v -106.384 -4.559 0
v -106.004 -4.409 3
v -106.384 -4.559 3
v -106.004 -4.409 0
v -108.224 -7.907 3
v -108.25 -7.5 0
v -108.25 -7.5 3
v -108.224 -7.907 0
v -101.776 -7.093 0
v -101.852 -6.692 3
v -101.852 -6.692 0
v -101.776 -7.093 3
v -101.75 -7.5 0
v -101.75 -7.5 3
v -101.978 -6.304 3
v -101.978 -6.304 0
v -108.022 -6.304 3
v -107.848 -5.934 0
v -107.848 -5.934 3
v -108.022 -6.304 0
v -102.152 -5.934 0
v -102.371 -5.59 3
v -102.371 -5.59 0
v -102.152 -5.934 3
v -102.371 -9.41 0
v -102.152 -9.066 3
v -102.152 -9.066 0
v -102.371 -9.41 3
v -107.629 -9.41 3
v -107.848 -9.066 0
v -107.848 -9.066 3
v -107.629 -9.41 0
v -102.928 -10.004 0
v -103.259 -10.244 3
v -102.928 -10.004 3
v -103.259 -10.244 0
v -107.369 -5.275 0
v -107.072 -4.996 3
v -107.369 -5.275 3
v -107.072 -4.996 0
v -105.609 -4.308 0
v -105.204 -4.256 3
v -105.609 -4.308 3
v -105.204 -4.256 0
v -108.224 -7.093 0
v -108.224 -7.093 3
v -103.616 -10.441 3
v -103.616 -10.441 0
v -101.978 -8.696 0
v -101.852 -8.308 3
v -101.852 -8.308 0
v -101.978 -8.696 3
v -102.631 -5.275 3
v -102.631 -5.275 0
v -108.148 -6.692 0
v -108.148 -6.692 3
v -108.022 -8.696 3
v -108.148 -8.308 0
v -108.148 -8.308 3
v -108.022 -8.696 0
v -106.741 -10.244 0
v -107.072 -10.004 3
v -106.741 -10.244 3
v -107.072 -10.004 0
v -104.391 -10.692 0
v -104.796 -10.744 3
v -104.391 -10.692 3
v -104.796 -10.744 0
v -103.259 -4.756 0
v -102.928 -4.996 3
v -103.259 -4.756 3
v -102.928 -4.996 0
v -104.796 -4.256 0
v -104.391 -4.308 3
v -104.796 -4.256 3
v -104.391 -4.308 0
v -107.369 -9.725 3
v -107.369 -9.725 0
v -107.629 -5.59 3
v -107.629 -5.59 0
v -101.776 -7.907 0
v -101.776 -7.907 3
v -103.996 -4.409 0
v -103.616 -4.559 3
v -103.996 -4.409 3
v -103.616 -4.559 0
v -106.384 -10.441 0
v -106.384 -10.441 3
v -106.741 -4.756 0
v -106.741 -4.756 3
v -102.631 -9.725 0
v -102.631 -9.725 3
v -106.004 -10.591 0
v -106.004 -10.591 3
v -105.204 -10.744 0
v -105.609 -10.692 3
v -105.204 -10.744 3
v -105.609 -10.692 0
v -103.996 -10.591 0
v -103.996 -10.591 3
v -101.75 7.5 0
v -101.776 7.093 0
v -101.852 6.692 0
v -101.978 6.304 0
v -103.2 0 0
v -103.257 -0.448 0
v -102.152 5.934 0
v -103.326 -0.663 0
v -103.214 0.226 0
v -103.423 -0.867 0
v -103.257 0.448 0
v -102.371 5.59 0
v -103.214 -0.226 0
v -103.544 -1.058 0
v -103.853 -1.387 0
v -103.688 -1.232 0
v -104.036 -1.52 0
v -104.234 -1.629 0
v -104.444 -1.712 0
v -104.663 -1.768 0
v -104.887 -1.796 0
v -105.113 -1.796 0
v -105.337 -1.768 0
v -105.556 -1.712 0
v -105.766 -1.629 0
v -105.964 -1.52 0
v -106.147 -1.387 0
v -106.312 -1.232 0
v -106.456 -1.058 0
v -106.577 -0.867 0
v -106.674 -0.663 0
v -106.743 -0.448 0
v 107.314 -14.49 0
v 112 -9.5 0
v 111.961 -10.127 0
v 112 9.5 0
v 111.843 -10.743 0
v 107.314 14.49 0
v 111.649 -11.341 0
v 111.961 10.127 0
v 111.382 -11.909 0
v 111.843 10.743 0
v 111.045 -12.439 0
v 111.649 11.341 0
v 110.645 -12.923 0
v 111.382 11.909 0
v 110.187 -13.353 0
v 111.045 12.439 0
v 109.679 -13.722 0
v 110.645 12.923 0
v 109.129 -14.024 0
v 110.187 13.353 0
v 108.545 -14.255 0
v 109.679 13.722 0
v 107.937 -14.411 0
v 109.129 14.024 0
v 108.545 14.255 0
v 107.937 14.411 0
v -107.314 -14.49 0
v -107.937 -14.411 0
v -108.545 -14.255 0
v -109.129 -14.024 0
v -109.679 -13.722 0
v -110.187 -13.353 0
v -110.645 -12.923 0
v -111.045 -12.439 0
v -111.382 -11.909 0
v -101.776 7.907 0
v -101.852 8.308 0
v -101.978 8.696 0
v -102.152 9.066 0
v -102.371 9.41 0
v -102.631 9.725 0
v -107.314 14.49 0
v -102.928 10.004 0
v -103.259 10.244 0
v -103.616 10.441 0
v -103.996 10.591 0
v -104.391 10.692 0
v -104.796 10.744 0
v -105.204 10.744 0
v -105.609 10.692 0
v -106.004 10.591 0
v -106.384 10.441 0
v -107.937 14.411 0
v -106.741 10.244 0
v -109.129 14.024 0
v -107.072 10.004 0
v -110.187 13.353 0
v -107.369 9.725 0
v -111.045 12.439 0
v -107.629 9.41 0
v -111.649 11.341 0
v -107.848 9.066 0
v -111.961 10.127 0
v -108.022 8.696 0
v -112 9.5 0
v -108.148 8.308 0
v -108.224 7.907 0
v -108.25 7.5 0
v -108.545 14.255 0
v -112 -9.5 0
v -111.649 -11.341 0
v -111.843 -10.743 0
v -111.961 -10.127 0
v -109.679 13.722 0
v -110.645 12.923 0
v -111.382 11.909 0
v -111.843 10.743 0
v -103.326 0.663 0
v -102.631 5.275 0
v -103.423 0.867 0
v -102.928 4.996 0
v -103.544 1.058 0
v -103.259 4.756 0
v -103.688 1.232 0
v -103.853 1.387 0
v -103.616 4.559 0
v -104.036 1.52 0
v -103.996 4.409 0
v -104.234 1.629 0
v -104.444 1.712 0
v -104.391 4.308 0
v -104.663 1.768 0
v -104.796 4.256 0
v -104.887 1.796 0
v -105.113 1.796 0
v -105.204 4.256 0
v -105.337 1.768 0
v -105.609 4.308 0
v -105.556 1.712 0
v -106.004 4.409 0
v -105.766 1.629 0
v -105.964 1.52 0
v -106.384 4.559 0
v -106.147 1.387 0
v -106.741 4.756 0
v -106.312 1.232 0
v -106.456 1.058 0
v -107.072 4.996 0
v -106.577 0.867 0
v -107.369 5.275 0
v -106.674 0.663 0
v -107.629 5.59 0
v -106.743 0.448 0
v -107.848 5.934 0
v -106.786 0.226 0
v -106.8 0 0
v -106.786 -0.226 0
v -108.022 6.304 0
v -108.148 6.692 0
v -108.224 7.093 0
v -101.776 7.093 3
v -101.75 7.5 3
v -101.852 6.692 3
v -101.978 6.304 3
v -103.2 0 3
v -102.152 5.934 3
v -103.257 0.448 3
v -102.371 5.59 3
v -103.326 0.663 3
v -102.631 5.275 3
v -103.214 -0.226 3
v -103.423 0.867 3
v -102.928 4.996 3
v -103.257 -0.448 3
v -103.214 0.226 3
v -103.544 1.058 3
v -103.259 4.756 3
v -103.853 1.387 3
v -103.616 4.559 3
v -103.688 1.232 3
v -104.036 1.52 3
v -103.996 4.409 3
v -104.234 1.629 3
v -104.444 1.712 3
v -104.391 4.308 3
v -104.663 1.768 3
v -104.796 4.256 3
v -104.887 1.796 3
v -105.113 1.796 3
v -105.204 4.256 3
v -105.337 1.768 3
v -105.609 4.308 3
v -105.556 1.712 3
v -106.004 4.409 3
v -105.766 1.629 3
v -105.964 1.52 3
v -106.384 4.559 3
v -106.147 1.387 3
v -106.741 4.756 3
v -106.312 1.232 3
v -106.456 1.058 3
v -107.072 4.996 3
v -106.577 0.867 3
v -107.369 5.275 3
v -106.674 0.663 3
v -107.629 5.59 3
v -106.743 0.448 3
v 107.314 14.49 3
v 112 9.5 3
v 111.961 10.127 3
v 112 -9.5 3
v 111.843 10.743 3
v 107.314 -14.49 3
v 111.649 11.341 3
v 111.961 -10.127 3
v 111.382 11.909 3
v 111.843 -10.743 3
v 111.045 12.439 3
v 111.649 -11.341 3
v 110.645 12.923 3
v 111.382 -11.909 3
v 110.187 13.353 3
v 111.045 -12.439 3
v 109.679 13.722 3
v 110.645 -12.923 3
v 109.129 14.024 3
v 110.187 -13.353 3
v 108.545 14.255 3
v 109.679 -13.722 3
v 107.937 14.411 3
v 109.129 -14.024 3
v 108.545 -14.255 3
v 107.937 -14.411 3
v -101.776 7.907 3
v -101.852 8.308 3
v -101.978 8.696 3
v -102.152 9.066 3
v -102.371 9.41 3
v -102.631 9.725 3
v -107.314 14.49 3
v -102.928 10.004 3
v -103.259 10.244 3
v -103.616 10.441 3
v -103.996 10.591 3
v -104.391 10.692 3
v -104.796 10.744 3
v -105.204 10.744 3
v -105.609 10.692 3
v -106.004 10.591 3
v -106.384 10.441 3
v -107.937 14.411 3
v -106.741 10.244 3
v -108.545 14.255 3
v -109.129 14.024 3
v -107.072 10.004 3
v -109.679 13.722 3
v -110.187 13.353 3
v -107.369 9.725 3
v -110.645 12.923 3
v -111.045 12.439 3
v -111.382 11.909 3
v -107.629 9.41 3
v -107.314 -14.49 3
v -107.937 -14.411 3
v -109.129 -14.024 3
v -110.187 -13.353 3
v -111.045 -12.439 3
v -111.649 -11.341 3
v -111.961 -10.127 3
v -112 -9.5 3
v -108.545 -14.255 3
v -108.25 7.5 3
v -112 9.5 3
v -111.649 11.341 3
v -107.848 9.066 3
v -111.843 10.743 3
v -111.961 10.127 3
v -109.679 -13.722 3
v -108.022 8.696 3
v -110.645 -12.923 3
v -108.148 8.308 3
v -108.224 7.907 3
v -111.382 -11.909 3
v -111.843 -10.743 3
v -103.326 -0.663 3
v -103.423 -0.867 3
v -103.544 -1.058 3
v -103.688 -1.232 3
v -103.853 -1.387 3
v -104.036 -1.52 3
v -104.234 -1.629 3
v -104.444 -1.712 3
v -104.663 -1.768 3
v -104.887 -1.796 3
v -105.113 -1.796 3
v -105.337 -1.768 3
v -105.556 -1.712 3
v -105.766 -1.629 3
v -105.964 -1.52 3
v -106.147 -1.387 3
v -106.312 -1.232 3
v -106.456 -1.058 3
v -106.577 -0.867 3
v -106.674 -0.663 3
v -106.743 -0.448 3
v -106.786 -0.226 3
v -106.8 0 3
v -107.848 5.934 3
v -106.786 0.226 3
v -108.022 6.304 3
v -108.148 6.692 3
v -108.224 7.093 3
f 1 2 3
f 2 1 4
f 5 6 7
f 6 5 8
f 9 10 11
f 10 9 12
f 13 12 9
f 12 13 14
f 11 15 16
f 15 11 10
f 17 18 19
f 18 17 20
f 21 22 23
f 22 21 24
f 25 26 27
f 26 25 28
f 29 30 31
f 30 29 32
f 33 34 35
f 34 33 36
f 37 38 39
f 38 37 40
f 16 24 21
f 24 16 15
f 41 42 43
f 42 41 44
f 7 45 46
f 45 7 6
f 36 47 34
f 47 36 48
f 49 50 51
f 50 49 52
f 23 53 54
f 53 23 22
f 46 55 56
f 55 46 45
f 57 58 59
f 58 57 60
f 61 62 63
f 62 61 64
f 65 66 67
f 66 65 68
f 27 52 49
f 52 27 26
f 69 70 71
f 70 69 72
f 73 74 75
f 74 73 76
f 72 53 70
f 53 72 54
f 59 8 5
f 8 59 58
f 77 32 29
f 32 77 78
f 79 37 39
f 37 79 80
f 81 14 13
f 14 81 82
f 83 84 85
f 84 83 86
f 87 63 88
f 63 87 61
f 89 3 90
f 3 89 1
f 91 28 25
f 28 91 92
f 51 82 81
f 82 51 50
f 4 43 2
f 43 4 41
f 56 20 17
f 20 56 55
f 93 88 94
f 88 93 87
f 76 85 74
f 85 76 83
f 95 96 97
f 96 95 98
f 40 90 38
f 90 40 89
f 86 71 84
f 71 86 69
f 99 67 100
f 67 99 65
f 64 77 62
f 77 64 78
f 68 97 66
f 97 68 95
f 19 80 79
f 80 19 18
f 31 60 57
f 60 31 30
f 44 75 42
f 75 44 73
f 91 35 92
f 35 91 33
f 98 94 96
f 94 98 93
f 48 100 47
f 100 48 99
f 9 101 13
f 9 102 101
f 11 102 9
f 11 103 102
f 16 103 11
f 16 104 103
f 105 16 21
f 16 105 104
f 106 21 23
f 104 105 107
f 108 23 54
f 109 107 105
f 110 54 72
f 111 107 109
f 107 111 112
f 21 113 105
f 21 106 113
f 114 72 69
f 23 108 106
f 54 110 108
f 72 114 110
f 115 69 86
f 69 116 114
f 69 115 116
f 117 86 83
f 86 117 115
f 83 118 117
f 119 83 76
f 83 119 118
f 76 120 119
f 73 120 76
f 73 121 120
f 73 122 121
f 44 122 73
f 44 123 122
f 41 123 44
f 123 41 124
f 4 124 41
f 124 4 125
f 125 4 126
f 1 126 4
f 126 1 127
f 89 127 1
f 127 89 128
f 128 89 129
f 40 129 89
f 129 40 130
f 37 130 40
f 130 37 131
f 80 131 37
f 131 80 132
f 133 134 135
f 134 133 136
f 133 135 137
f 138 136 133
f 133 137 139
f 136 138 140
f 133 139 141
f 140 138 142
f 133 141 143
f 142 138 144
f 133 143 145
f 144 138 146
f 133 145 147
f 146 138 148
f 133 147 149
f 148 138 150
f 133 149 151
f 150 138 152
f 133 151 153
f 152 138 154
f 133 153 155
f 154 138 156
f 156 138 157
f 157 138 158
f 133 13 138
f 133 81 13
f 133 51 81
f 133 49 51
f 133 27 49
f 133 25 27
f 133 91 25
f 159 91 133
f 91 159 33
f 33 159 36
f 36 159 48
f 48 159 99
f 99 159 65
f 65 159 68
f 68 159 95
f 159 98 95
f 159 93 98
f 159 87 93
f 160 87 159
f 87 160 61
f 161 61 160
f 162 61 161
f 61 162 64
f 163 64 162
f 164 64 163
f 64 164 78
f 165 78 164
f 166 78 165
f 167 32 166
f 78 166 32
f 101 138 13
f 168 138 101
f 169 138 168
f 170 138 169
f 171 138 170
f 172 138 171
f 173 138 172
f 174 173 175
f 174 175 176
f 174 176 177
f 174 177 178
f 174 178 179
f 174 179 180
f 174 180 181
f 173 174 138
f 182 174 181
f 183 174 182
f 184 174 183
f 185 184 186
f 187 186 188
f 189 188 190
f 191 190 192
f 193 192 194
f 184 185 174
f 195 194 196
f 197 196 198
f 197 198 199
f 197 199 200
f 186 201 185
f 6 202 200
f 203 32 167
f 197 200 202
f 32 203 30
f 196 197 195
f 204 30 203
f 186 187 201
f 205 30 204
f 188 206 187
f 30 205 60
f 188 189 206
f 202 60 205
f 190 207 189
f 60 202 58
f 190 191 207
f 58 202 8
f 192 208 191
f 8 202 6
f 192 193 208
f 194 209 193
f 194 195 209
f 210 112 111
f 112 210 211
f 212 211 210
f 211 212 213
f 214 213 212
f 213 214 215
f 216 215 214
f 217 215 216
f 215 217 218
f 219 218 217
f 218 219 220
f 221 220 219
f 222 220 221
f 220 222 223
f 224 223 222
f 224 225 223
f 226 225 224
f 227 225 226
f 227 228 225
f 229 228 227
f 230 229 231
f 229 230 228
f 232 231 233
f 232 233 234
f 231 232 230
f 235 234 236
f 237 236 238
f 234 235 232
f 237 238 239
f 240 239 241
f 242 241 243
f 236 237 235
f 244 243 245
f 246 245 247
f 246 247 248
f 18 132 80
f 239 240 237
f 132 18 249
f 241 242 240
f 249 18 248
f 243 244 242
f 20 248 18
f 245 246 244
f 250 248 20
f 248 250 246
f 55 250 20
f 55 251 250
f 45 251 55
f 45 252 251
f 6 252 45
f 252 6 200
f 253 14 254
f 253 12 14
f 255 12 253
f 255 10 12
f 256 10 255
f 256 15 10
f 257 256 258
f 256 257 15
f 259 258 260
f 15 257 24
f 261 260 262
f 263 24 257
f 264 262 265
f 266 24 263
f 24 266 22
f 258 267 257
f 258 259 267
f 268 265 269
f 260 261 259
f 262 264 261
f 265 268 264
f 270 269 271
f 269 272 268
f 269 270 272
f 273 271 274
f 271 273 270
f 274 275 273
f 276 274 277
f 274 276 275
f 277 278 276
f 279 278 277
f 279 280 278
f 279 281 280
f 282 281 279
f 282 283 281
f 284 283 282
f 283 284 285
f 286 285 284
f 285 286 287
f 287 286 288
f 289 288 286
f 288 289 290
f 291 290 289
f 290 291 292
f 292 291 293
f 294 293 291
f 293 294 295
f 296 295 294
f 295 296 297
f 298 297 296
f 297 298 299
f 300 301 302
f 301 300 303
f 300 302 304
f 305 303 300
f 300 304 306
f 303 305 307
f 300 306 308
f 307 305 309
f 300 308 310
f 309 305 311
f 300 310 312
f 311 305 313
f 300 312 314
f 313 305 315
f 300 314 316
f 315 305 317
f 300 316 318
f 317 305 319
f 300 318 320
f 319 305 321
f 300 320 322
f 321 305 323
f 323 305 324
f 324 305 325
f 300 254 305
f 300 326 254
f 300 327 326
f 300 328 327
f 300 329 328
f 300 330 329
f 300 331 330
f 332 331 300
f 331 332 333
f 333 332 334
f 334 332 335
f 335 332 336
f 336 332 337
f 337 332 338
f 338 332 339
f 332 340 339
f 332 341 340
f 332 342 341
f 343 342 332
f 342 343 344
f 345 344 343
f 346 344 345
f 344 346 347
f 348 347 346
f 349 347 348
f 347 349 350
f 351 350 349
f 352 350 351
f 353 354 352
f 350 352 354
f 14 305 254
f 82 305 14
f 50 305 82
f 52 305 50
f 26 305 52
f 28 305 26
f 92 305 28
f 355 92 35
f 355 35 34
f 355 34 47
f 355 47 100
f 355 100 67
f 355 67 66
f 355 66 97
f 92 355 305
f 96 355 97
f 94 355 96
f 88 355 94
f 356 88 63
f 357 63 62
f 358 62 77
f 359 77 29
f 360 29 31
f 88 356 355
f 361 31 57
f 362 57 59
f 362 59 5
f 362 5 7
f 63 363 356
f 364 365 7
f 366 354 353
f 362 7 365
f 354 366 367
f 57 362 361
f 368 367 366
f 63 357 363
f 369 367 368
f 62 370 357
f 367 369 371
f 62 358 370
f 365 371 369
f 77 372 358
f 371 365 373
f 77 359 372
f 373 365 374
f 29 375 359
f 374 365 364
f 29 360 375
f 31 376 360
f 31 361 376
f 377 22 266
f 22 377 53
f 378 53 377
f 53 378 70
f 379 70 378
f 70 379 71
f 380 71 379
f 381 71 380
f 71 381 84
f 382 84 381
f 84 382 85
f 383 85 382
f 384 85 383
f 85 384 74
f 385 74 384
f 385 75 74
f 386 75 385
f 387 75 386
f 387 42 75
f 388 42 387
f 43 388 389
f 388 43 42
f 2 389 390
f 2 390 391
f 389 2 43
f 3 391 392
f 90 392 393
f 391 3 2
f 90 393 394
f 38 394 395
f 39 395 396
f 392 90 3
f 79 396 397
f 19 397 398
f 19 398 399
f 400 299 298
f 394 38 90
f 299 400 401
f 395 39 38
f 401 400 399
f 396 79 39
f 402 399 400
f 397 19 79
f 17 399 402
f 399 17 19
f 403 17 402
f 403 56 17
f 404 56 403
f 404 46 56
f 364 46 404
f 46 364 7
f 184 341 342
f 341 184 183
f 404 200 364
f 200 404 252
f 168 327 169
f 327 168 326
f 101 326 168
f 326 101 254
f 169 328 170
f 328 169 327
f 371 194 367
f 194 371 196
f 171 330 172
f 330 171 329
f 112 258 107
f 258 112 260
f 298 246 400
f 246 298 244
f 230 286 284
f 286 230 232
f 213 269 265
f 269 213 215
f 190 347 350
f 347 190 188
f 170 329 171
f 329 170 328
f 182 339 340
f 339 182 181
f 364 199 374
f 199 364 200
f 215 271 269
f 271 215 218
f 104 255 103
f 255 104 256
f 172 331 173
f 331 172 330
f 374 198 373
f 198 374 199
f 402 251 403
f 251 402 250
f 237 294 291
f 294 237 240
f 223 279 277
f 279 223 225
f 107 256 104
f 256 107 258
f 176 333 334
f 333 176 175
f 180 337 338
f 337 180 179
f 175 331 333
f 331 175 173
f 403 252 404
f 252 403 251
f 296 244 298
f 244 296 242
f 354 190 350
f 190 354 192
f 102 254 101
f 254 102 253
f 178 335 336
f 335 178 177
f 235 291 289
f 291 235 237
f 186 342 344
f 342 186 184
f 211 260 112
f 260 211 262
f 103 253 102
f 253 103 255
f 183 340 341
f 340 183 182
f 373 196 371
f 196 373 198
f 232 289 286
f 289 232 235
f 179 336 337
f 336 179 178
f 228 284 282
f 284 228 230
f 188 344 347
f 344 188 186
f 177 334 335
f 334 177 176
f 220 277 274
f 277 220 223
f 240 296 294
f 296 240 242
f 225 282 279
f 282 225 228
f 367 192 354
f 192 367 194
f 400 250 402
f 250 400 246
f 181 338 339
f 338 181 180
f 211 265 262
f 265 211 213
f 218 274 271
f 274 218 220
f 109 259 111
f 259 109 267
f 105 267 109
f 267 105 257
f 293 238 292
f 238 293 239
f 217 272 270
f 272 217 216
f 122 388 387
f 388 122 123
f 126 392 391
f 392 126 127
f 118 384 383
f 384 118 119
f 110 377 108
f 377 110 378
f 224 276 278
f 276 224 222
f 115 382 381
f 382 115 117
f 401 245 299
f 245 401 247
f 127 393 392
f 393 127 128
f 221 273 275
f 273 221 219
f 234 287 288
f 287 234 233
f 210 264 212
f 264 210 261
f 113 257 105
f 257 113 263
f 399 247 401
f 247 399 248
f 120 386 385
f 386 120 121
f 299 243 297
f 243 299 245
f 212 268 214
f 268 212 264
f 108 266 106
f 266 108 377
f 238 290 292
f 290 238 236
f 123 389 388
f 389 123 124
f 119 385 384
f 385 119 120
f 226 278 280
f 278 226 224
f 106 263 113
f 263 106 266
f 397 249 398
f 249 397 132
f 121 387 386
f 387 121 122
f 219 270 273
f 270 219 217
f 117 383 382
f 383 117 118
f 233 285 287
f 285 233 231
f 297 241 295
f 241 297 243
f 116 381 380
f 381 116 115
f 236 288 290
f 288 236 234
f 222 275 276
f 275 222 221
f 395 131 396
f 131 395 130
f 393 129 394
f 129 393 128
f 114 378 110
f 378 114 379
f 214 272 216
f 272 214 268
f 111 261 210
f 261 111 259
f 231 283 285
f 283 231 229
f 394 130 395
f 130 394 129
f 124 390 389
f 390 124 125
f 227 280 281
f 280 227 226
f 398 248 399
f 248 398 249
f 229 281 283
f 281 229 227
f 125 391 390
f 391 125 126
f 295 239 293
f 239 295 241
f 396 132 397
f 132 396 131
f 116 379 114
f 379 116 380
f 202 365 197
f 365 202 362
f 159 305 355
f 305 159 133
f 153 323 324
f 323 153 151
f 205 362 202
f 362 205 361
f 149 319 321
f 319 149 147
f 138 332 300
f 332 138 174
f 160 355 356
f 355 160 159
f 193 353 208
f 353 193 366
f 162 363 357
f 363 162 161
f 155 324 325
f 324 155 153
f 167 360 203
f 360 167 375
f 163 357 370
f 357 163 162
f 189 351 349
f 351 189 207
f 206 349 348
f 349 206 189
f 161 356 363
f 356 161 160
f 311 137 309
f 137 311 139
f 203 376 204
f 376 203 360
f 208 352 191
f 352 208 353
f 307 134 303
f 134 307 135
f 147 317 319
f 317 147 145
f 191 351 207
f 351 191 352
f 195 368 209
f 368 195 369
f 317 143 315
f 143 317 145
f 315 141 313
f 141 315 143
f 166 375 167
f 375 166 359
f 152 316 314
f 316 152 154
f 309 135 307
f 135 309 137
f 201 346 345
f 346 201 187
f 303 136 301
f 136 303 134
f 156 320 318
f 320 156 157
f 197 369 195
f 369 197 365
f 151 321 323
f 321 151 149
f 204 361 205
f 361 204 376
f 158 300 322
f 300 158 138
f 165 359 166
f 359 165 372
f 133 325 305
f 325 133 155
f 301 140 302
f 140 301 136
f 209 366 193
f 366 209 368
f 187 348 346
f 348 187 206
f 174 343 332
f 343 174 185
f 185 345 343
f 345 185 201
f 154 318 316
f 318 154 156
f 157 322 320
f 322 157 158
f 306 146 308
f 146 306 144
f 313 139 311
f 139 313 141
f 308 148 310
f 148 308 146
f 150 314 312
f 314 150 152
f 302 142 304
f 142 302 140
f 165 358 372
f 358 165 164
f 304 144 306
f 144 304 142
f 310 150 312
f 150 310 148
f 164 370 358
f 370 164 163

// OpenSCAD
$fn = 50;


difference() {
	union() {
		hull() {
			translate(v = [-107.0000000000, 9.5000000000, 0]) {
				cylinder(h = 3, r = 5);
			}
			translate(v = [107.0000000000, 9.5000000000, 0]) {
				cylinder(h = 3, r = 5);
			}
			translate(v = [-107.0000000000, -9.5000000000, 0]) {
				cylinder(h = 3, r = 5);
			}
			translate(v = [107.0000000000, -9.5000000000, 0]) {
				cylinder(h = 3, r = 5);
			}
		}
	}
	union() {
		translate(v = [-105.0000000000, -7.5000000000, 0]) {
			cylinder(h = 3, r = 3.2500000000);
		}
		translate(v = [-105.0000000000, 7.5000000000, 0]) {
			cylinder(h = 3, r = 3.2500000000);
		}
		translate(v = [-105.0000000000, -7.5000000000, 0]) {
			cylinder(h = 3, r = 1.8000000000);
		}
		translate(v = [-105.0000000000, 0.0000000000, 0]) {
			cylinder(h = 3, r = 1.8000000000);
		}
		translate(v = [-105.0000000000, 7.5000000000, 0]) {
			cylinder(h = 3, r = 1.8000000000);
		}
		translate(v = [-105.0000000000, -7.5000000000, 0]) {
			cylinder(h = 3, r = 1.8000000000);
		}
		translate(v = [-105.0000000000, 0.0000000000, 0]) {
			cylinder(h = 3, r = 1.8000000000);
		}
		translate(v = [-105.0000000000, 7.5000000000, 0]) {
			cylinder(h = 3, r = 1.8000000000);
		}
		translate(v = [-105.0000000000, -7.5000000000, 0]) {
			cylinder(h = 3, r = 1.8000000000);
		}
		translate(v = [-105.0000000000, 0.0000000000, 0]) {
			cylinder(h = 3, r = 1.8000000000);
		}
		translate(v = [-105.0000000000, 7.5000000000, 0]) {
			cylinder(h = 3, r = 1.8000000000);
		}
	}
}
